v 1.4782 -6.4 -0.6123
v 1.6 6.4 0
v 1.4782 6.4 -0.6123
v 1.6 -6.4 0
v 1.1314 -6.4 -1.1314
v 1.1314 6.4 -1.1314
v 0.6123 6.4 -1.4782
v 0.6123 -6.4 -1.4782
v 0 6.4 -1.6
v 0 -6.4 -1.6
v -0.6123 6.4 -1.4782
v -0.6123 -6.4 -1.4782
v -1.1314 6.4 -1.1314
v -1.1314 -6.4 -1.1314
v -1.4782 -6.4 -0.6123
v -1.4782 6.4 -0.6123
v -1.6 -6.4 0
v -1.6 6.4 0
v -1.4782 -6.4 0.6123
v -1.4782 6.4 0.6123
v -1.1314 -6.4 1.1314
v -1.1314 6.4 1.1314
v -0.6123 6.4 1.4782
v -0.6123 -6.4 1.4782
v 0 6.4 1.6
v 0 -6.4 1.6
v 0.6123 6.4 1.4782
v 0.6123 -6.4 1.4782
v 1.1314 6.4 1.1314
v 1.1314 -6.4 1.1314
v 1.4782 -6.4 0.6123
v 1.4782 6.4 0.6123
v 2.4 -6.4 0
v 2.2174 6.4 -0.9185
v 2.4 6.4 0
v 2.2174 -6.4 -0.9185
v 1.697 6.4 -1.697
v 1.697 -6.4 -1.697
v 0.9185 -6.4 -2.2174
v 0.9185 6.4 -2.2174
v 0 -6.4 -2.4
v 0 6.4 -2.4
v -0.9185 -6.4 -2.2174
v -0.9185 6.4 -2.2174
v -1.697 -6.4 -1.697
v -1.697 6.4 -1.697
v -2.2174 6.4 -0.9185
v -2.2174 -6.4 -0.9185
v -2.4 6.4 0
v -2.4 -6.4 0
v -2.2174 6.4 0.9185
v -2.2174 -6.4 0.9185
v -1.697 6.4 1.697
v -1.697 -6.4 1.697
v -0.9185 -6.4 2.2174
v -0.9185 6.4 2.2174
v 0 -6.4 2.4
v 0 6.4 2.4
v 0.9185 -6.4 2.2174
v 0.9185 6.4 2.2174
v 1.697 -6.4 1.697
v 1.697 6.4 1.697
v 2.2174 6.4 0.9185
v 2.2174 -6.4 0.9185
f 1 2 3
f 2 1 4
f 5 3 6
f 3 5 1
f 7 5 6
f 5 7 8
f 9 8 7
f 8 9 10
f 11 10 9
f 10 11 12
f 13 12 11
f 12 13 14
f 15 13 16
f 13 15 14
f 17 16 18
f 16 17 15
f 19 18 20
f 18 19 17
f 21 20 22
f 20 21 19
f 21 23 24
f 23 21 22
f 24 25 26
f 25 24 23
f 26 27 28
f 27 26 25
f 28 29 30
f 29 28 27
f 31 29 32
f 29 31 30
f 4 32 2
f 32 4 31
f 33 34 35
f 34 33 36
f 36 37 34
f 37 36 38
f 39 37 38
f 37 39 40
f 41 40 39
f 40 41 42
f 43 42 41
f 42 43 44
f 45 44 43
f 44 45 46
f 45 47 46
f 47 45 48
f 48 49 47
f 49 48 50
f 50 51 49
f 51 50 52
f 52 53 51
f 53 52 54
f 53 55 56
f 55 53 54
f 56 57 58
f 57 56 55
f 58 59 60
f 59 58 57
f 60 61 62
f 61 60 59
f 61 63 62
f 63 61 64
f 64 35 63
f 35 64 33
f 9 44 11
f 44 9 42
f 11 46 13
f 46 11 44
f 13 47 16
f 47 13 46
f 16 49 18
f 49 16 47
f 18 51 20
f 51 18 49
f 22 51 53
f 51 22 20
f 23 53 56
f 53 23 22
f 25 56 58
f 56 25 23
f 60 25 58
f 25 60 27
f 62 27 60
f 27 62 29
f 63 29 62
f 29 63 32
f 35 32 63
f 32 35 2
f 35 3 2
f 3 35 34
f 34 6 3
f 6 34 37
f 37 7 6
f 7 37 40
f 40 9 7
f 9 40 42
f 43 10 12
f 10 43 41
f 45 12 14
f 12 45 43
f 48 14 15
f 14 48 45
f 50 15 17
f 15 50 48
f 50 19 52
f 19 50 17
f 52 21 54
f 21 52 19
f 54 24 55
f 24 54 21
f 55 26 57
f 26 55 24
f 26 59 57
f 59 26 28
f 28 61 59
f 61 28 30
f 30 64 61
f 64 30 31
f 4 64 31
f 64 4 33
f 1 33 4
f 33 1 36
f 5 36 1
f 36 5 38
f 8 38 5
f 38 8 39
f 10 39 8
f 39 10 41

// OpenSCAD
// file: ../p/4-4ring2.scad
use <../lib.scad>
function ldraw_lib__4_4ring2() = [
// 0 Ring  2 x 1.0
// 0 Name: 4-4ring2.dat
// 0 Author: James Jessiman
// 0 !LDRAW_ORG Primitive UPDATE 2009-01
// 0 !LICENSE Licensed under CC BY 2.0 and CC BY 4.0 : see CAreadme.txt
// 
// 0 BFC CERTIFY CCW
  [0,"BFC","CERTIFY"],
  [0,"BFC","CCW"],
// 
// 0 !HISTORY 1998-12-15 [PTadmin] Official Update 1998-10
// 0 !HISTORY 2002-04-05 [hafhead] Added BFC statement
// 0 !HISTORY 2002-04-25 [PTadmin] Official Update 2002-02
// 0 !HISTORY 2007-06-24 [PTadmin] Header formatted for Contributor Agreement
// 0 !HISTORY 2008-07-01 [PTadmin] Official Update 2008-01
// 0 !HISTORY 2008-08-26 [cwdee] Switch polygon winding and rename
// 0 !HISTORY 2009-05-02 [PTadmin] Official Update 2009-01
// 
// 
// 4 16 -1.1481 0 2.7717 -0.7654 0 1.8478 0 0 2 0 0 3
  [4,16,-1.1481,0,2.7717,-0.7654,0,1.8478,0,0,2,0,0,3],
// 4 16 -2.1213 0 2.1213 -1.4142 0 1.4142 -0.7654 0 1.8478 -1.1481 0 2.7717
  [4,16,-2.1213,0,2.1213,-1.4142,0,1.4142,-0.7654,0,1.8478,-1.1481,0,2.7717],
// 4 16 -2.7717 0 1.1481 -1.8478 0 0.7654 -1.4142 0 1.4142 -2.1213 0 2.1213
  [4,16,-2.7717,0,1.1481,-1.8478,0,0.7654,-1.4142,0,1.4142,-2.1213,0,2.1213],
// 4 16 -3 0 0 -2 0 0 -1.8478 0 0.7654 -2.7717 0 1.1481
  [4,16,-3,0,0,-2,0,0,-1.8478,0,0.7654,-2.7717,0,1.1481],
// 4 16 -2.7717 0 -1.1481 -1.8478 0 -0.7654 -2 0 0 -3 0 0
  [4,16,-2.7717,0,-1.1481,-1.8478,0,-0.7654,-2,0,0,-3,0,0],
// 4 16 -2.1213 0 -2.1213 -1.4142 0 -1.4142 -1.8478 0 -0.7654 -2.7717 0 -1.1481
  [4,16,-2.1213,0,-2.1213,-1.4142,0,-1.4142,-1.8478,0,-0.7654,-2.7717,0,-1.1481],
// 4 16 -1.1481 0 -2.7717 -0.7654 0 -1.8478 -1.4142 0 -1.4142 -2.1213 0 -2.1213
  [4,16,-1.1481,0,-2.7717,-0.7654,0,-1.8478,-1.4142,0,-1.4142,-2.1213,0,-2.1213],
// 4 16 0 0 -3 0 0 -2 -0.7654 0 -1.8478 -1.1481 0 -2.7717
  [4,16,0,0,-3,0,0,-2,-0.7654,0,-1.8478,-1.1481,0,-2.7717],
// 4 16 1.1481 0 -2.7717 0.7654 0 -1.8478 0 0 -2 0 0 -3
  [4,16,1.1481,0,-2.7717,0.7654,0,-1.8478,0,0,-2,0,0,-3],
// 4 16 2.1213 0 -2.1213 1.4142 0 -1.4142 0.7654 0 -1.8478 1.1481 0 -2.7717
  [4,16,2.1213,0,-2.1213,1.4142,0,-1.4142,0.7654,0,-1.8478,1.1481,0,-2.7717],
// 4 16 2.7717 0 -1.1481 1.8478 0 -0.7654 1.4142 0 -1.4142 2.1213 0 -2.1213
  [4,16,2.7717,0,-1.1481,1.8478,0,-0.7654,1.4142,0,-1.4142,2.1213,0,-2.1213],
// 4 16 3 0 0 2 0 0 1.8478 0 -0.7654 2.7717 0 -1.1481
  [4,16,3,0,0,2,0,0,1.8478,0,-0.7654,2.7717,0,-1.1481],
// 4 16 2.7717 0 1.1481 1.8478 0 0.7654 2 0 0 3 0 0
  [4,16,2.7717,0,1.1481,1.8478,0,0.7654,2,0,0,3,0,0],
// 4 16 2.1213 0 2.1213 1.4142 0 1.4142 1.8478 0 0.7654 2.7717 0 1.1481
  [4,16,2.1213,0,2.1213,1.4142,0,1.4142,1.8478,0,0.7654,2.7717,0,1.1481],
// 4 16 1.1481 0 2.7717 0.7654 0 1.8478 1.4142 0 1.4142 2.1213 0 2.1213
  [4,16,1.1481,0,2.7717,0.7654,0,1.8478,1.4142,0,1.4142,2.1213,0,2.1213],
// 4 16 0 0 3 0 0 2 0.7654 0 1.8478 1.1481 0 2.7717
  [4,16,0,0,3,0,0,2,0.7654,0,1.8478,1.1481,0,2.7717],
// 0
];
module ldraw_lib__4_4ring2(step=0, col=false, unit=2/5, alt=false, line=0.2, solid=!$preview)
    makepoly(ldraw_lib__4_4ring2(), step=step, col=col, unit=unit, alt=alt, line=line, solid=solid);
ldraw_lib__4_4ring2(line=0.2);
// file: ../p/4-4edge.scad
use <../lib.scad>
function ldraw_lib__4_4edge() = [
// 0 Circle 1.0
// 0 Name: 4-4edge.dat
// 0 Author: James Jessiman
// 0 !LDRAW_ORG Primitive UPDATE 2017-01
// 0 !LICENSE Licensed under CC BY 4.0 : see CAreadme.txt
// 
// 0 BFC CERTIFY CCW
  [0,"BFC","CERTIFY"],
  [0,"BFC","CCW"],
// 
// 0 !HISTORY 1998-12-15 [PTadmin] Official Update 1998-10
// 0 !HISTORY 2005-12-28 [PTadmin] Official Update 2005-01
// 0 !HISTORY 2007-06-24 [PTadmin] Header formatted for Contributor Agreement
// 0 !HISTORY 2008-07-01 [PTadmin] Official Update 2008-01
// 0 !HISTORY 2017-01-15 [Steffen] BFCed
// 0 !HISTORY 2017-12-30 [PTadmin] Official Update 2017-01
// 
// 
// 2 24 1 0 0 0.9239 0 0.3827
  [2,24,1,0,0,0.9239,0,0.3827],
// 2 24 0.9239 0 0.3827 0.7071 0 0.7071
  [2,24,0.9239,0,0.3827,0.7071,0,0.7071],
// 2 24 0.7071 0 0.7071 0.3827 0 0.9239
  [2,24,0.7071,0,0.7071,0.3827,0,0.9239],
// 2 24 0.3827 0 0.9239 0 0 1
  [2,24,0.3827,0,0.9239,0,0,1],
// 2 24 0 0 1 -0.3827 0 0.9239
  [2,24,0,0,1,-0.3827,0,0.9239],
// 2 24 -0.3827 0 0.9239 -0.7071 0 0.7071
  [2,24,-0.3827,0,0.9239,-0.7071,0,0.7071],
// 2 24 -0.7071 0 0.7071 -0.9239 0 0.3827
  [2,24,-0.7071,0,0.7071,-0.9239,0,0.3827],
// 2 24 -0.9239 0 0.3827 -1 0 -0
  [2,24,-0.9239,0,0.3827,-1,0,-0],
// 2 24 -1 0 -0 -0.9239 0 -0.3827
  [2,24,-1,0,-0,-0.9239,0,-0.3827],
// 2 24 -0.9239 0 -0.3827 -0.7071 0 -0.7071
  [2,24,-0.9239,0,-0.3827,-0.7071,0,-0.7071],
// 2 24 -0.7071 0 -0.7071 -0.3827 0 -0.9239
  [2,24,-0.7071,0,-0.7071,-0.3827,0,-0.9239],
// 2 24 -0.3827 0 -0.9239 0 0 -1
  [2,24,-0.3827,0,-0.9239,0,0,-1],
// 2 24 0 0 -1 0.3827 0 -0.9239
  [2,24,0,0,-1,0.3827,0,-0.9239],
// 2 24 0.3827 0 -0.9239 0.7071 0 -0.7071
  [2,24,0.3827,0,-0.9239,0.7071,0,-0.7071],
// 2 24 0.7071 0 -0.7071 0.9239 0 -0.3827
  [2,24,0.7071,0,-0.7071,0.9239,0,-0.3827],
// 2 24 0.9239 0 -0.3827 1 0 0
  [2,24,0.9239,0,-0.3827,1,0,0],
];
module ldraw_lib__4_4edge(step=0, col=false, unit=2/5, alt=false, line=0.2, solid=!$preview)
    makepoly(ldraw_lib__4_4edge(), step=step, col=col, unit=unit, alt=alt, line=line, solid=solid);
ldraw_lib__4_4edge(line=0.2);
// file: ../p/4-4cyli.scad
use <../lib.scad>
function ldraw_lib__4_4cyli() = [
// 0 Cylinder 1.0
// 0 Name: 4-4cyli.dat
// 0 Author: James Jessiman
// 0 !LDRAW_ORG Primitive UPDATE 2005-01
// 0 !LICENSE Licensed under CC BY 2.0 and CC BY 4.0 : see CAreadme.txt
// 
// 0 BFC CERTIFY CCW
  [0,"BFC","CERTIFY"],
  [0,"BFC","CCW"],
// 
// 0 !HISTORY 1998-12-15 [PTadmin] Official Update 1998-10
// 0 !HISTORY 2002-03-23 [sbliss] Added BFC statement; merged headers from files in distributions LDraw 0.27 and Complete.
// 0 !HISTORY 2002-04-25 [PTadmin] Official Update 2002-02
// 0 !HISTORY 2004-12-14 [guyvivan] BFC CCW
// 0 !HISTORY 2005-12-28 [PTadmin] Official Update 2005-01
// 0 !HISTORY 2007-06-24 [PTadmin] Header formatted for Contributor Agreement
// 0 !HISTORY 2008-07-01 [PTadmin] Official Update 2008-01
// 
// 
// 4 16 1 1 0 0.9239 1 0.3827 0.9239 0 0.3827 1 0 0
  [4,16,1,1,0,0.9239,1,0.3827,0.9239,0,0.3827,1,0,0],
// 5 24 1 0 0 1 1 0 0.9239 0 0.3827 0.9239 0 -0.3827
  [5,24,1,0,0,1,1,0,0.9239,0,0.3827,0.9239,0,-0.3827],
// 4 16 0.9239 1 0.3827 0.7071 1 0.7071 0.7071 0 0.7071 0.9239 0 0.3827
  [4,16,0.9239,1,0.3827,0.7071,1,0.7071,0.7071,0,0.7071,0.9239,0,0.3827],
// 5 24 0.9239 0 0.3827 0.9239 1 0.3827 0.7071 0 0.7071 1 0 0
  [5,24,0.9239,0,0.3827,0.9239,1,0.3827,0.7071,0,0.7071,1,0,0],
// 4 16 0.7071 1 0.7071 0.3827 1 0.9239 0.3827 0 0.9239 0.7071 0 0.7071
  [4,16,0.7071,1,0.7071,0.3827,1,0.9239,0.3827,0,0.9239,0.7071,0,0.7071],
// 5 24 0.7071 0 0.7071 0.7071 1 0.7071 0.3827 0 0.9239 0.9239 0 0.3827
  [5,24,0.7071,0,0.7071,0.7071,1,0.7071,0.3827,0,0.9239,0.9239,0,0.3827],
// 4 16 0.3827 1 0.9239 0 1 1 0 0 1 0.3827 0 0.9239
  [4,16,0.3827,1,0.9239,0,1,1,0,0,1,0.3827,0,0.9239],
// 5 24 0.3827 0 0.9239 0.3827 1 0.9239 0 0 1 0.7071 0 0.7071
  [5,24,0.3827,0,0.9239,0.3827,1,0.9239,0,0,1,0.7071,0,0.7071],
// 4 16 0 1 1 -0.3827 1 0.9239 -0.3827 0 0.9239 0 0 1
  [4,16,0,1,1,-0.3827,1,0.9239,-0.3827,0,0.9239,0,0,1],
// 5 24 0 0 1 0 1 1 -0.3827 0 0.9239 0.3827 0 0.9239
  [5,24,0,0,1,0,1,1,-0.3827,0,0.9239,0.3827,0,0.9239],
// 4 16 -0.3827 1 0.9239 -0.7071 1 0.7071 -0.7071 0 0.7071 -0.3827 0 0.9239
  [4,16,-0.3827,1,0.9239,-0.7071,1,0.7071,-0.7071,0,0.7071,-0.3827,0,0.9239],
// 5 24 -0.3827 0 0.9239 -0.3827 1 0.9239 -0.7071 0 0.7071 0 0 1
  [5,24,-0.3827,0,0.9239,-0.3827,1,0.9239,-0.7071,0,0.7071,0,0,1],
// 4 16 -0.7071 1 0.7071 -0.9239 1 0.3827 -0.9239 0 0.3827 -0.7071 0 0.7071
  [4,16,-0.7071,1,0.7071,-0.9239,1,0.3827,-0.9239,0,0.3827,-0.7071,0,0.7071],
// 5 24 -0.7071 0 0.7071 -0.7071 1 0.7071 -0.9239 0 0.3827 -0.3827 0 0.9239
  [5,24,-0.7071,0,0.7071,-0.7071,1,0.7071,-0.9239,0,0.3827,-0.3827,0,0.9239],
// 4 16 -0.9239 1 0.3827 -1 1 0 -1 0 0 -0.9239 0 0.3827
  [4,16,-0.9239,1,0.3827,-1,1,0,-1,0,0,-0.9239,0,0.3827],
// 5 24 -0.9239 0 0.3827 -0.9239 1 0.3827 -1 0 0 -0.7071 0 0.7071
  [5,24,-0.9239,0,0.3827,-0.9239,1,0.3827,-1,0,0,-0.7071,0,0.7071],
// 4 16 -1 1 0 -0.9239 1 -0.3827 -0.9239 0 -0.3827 -1 0 0
  [4,16,-1,1,0,-0.9239,1,-0.3827,-0.9239,0,-0.3827,-1,0,0],
// 5 24 -1 0 0 -1 1 0 -0.9239 0 -0.3827 -0.9239 0 0.3827
  [5,24,-1,0,0,-1,1,0,-0.9239,0,-0.3827,-0.9239,0,0.3827],
// 4 16 -0.9239 1 -0.3827 -0.7071 1 -0.7071 -0.7071 0 -0.7071 -0.9239 0 -0.3827
  [4,16,-0.9239,1,-0.3827,-0.7071,1,-0.7071,-0.7071,0,-0.7071,-0.9239,0,-0.3827],
// 5 24 -0.9239 0 -0.3827 -0.9239 1 -0.3827 -0.7071 0 -0.7071 -1 0 0
  [5,24,-0.9239,0,-0.3827,-0.9239,1,-0.3827,-0.7071,0,-0.7071,-1,0,0],
// 4 16 -0.7071 1 -0.7071 -0.3827 1 -0.9239 -0.3827 0 -0.9239 -0.7071 0 -0.7071
  [4,16,-0.7071,1,-0.7071,-0.3827,1,-0.9239,-0.3827,0,-0.9239,-0.7071,0,-0.7071],
// 5 24 -0.7071 0 -0.7071 -0.7071 1 -0.7071 -0.3827 0 -0.9239 -0.9239 0 -0.3827
  [5,24,-0.7071,0,-0.7071,-0.7071,1,-0.7071,-0.3827,0,-0.9239,-0.9239,0,-0.3827],
// 4 16 -0.3827 1 -0.9239 0 1 -1 0 0 -1 -0.3827 0 -0.9239
  [4,16,-0.3827,1,-0.9239,0,1,-1,0,0,-1,-0.3827,0,-0.9239],
// 5 24 -0.3827 0 -0.9239 -0.3827 1 -0.9239 0 0 -1 -0.7071 0 -0.7071
  [5,24,-0.3827,0,-0.9239,-0.3827,1,-0.9239,0,0,-1,-0.7071,0,-0.7071],
// 4 16 0 1 -1 0.3827 1 -0.9239 0.3827 0 -0.9239 0 0 -1
  [4,16,0,1,-1,0.3827,1,-0.9239,0.3827,0,-0.9239,0,0,-1],
// 5 24 0 0 -1 0 1 -1 0.3827 0 -0.9239 -0.3827 0 -0.9239
  [5,24,0,0,-1,0,1,-1,0.3827,0,-0.9239,-0.3827,0,-0.9239],
// 4 16 0.3827 1 -0.9239 0.7071 1 -0.7071 0.7071 0 -0.7071 0.3827 0 -0.9239
  [4,16,0.3827,1,-0.9239,0.7071,1,-0.7071,0.7071,0,-0.7071,0.3827,0,-0.9239],
// 5 24 0.3827 0 -0.9239 0.3827 1 -0.9239 0.7071 0 -0.7071 0 0 -1
  [5,24,0.3827,0,-0.9239,0.3827,1,-0.9239,0.7071,0,-0.7071,0,0,-1],
// 4 16 0.7071 1 -0.7071 0.9239 1 -0.3827 0.9239 0 -0.3827 0.7071 0 -0.7071
  [4,16,0.7071,1,-0.7071,0.9239,1,-0.3827,0.9239,0,-0.3827,0.7071,0,-0.7071],
// 5 24 0.7071 0 -0.7071 0.7071 1 -0.7071 0.9239 0 -0.3827 0.3827 0 -0.9239
  [5,24,0.7071,0,-0.7071,0.7071,1,-0.7071,0.9239,0,-0.3827,0.3827,0,-0.9239],
// 4 16 0.9239 1 -0.3827 1 1 0 1 0 0 0.9239 0 -0.3827
  [4,16,0.9239,1,-0.3827,1,1,0,1,0,0,0.9239,0,-0.3827],
// 5 24 0.9239 0 -0.3827 0.9239 1 -0.3827 1 0 0 0.7071 0 -0.7071
  [5,24,0.9239,0,-0.3827,0.9239,1,-0.3827,1,0,0,0.7071,0,-0.7071],
// 0
];
module ldraw_lib__4_4cyli(step=0, col=false, unit=2/5, alt=false, line=0.2, solid=!$preview)
    makepoly(ldraw_lib__4_4cyli(), step=step, col=col, unit=unit, alt=alt, line=line, solid=solid);
ldraw_lib__4_4cyli(line=0.2);
// main file
use <../lib.scad>
use <../p/4-4cyli.scad>
use <../p/4-4edge.scad>
use <../p/4-4ring2.scad>
function ldraw_lib__3112() = [
// 0 ~Axle Bush 1.6L
// 0 Name: 3112.dat
// 0 Author: James Jessiman
// 0 !LDRAW_ORG Part UPDATE 2018-02
// 0 !LICENSE Licensed under CC BY 4.0 : see CAreadme.txt
// 
// 0 BFC CERTIFY CW
  [0,"BFC","CERTIFY"],
  [0,"BFC","CW"],
// 
// 0 !CATEGORY Wheel
// 
// 0 !HISTORY 2007-06-25 [PTadmin] Header formatted for Contributor Agreement
// 0 !HISTORY 2008-07-01 [PTadmin] Official Update 2008-01
// 0 !HISTORY 2008-07-07 [mkennedy] Completed header, BFC'ed, Optimized
// 0 !HISTORY 2008-08-23 [PTadmin] Renamed from 34c
// 0 !HISTORY 2009-05-02 [PTadmin] Official Update 2009-01
// 0 !HISTORY 2018-11-24 [cwdee] Update description
// 0 !HISTORY 2018-12-08 [PTadmin] Official Update 2018-02
// 
// 
// 0 BFC INVERTNEXT
  [0,"BFC","INVERTNEXT"],
// 1 16 0 0 -16 4 0 0 0 0 4 0 32 0 4-4cyli.dat
  [1,16,0,0,-16,4,0,0,0,0,4,0,32,0, ldraw_lib__4_4cyli()],
// 1 16 0 0 -16 6 0 0 0 0 6 0 32 0 4-4cyli.dat
  [1,16,0,0,-16,6,0,0,0,0,6,0,32,0, ldraw_lib__4_4cyli()],
// 1 16 0 0 -16 4 0 0 0 0 4 0 1 0 4-4edge.dat
  [1,16,0,0,-16,4,0,0,0,0,4,0,1,0, ldraw_lib__4_4edge()],
// 1 16 0 0 16 4 0 0 0 0 4 0 1 0 4-4edge.dat
  [1,16,0,0,16,4,0,0,0,0,4,0,1,0, ldraw_lib__4_4edge()],
// 1 16 0 0 -16 6 0 0 0 0 6 0 1 0 4-4edge.dat
  [1,16,0,0,-16,6,0,0,0,0,6,0,1,0, ldraw_lib__4_4edge()],
// 1 16 0 0 16 6 0 0 0 0 6 0 1 0 4-4edge.dat
  [1,16,0,0,16,6,0,0,0,0,6,0,1,0, ldraw_lib__4_4edge()],
// 1 16 0 0 16 2 0 0 0 0 2 0 -1 0 4-4ring2.dat
  [1,16,0,0,16,2,0,0,0,0,2,0,-1,0, ldraw_lib__4_4ring2()],
// 1 16 0 0 -16 2 0 0 0 0 2 0 1 0 4-4ring2.dat
  [1,16,0,0,-16,2,0,0,0,0,2,0,1,0, ldraw_lib__4_4ring2()],
// 0
// 
];
module ldraw_lib__3112(step=0, col=false, unit=2/5, alt=false, line=0.2, solid=!$preview)
    makepoly(ldraw_lib__3112(), step=step, col=col, unit=unit, alt=alt, line=line, solid=solid);
ldraw_lib__3112(line=0.2);
